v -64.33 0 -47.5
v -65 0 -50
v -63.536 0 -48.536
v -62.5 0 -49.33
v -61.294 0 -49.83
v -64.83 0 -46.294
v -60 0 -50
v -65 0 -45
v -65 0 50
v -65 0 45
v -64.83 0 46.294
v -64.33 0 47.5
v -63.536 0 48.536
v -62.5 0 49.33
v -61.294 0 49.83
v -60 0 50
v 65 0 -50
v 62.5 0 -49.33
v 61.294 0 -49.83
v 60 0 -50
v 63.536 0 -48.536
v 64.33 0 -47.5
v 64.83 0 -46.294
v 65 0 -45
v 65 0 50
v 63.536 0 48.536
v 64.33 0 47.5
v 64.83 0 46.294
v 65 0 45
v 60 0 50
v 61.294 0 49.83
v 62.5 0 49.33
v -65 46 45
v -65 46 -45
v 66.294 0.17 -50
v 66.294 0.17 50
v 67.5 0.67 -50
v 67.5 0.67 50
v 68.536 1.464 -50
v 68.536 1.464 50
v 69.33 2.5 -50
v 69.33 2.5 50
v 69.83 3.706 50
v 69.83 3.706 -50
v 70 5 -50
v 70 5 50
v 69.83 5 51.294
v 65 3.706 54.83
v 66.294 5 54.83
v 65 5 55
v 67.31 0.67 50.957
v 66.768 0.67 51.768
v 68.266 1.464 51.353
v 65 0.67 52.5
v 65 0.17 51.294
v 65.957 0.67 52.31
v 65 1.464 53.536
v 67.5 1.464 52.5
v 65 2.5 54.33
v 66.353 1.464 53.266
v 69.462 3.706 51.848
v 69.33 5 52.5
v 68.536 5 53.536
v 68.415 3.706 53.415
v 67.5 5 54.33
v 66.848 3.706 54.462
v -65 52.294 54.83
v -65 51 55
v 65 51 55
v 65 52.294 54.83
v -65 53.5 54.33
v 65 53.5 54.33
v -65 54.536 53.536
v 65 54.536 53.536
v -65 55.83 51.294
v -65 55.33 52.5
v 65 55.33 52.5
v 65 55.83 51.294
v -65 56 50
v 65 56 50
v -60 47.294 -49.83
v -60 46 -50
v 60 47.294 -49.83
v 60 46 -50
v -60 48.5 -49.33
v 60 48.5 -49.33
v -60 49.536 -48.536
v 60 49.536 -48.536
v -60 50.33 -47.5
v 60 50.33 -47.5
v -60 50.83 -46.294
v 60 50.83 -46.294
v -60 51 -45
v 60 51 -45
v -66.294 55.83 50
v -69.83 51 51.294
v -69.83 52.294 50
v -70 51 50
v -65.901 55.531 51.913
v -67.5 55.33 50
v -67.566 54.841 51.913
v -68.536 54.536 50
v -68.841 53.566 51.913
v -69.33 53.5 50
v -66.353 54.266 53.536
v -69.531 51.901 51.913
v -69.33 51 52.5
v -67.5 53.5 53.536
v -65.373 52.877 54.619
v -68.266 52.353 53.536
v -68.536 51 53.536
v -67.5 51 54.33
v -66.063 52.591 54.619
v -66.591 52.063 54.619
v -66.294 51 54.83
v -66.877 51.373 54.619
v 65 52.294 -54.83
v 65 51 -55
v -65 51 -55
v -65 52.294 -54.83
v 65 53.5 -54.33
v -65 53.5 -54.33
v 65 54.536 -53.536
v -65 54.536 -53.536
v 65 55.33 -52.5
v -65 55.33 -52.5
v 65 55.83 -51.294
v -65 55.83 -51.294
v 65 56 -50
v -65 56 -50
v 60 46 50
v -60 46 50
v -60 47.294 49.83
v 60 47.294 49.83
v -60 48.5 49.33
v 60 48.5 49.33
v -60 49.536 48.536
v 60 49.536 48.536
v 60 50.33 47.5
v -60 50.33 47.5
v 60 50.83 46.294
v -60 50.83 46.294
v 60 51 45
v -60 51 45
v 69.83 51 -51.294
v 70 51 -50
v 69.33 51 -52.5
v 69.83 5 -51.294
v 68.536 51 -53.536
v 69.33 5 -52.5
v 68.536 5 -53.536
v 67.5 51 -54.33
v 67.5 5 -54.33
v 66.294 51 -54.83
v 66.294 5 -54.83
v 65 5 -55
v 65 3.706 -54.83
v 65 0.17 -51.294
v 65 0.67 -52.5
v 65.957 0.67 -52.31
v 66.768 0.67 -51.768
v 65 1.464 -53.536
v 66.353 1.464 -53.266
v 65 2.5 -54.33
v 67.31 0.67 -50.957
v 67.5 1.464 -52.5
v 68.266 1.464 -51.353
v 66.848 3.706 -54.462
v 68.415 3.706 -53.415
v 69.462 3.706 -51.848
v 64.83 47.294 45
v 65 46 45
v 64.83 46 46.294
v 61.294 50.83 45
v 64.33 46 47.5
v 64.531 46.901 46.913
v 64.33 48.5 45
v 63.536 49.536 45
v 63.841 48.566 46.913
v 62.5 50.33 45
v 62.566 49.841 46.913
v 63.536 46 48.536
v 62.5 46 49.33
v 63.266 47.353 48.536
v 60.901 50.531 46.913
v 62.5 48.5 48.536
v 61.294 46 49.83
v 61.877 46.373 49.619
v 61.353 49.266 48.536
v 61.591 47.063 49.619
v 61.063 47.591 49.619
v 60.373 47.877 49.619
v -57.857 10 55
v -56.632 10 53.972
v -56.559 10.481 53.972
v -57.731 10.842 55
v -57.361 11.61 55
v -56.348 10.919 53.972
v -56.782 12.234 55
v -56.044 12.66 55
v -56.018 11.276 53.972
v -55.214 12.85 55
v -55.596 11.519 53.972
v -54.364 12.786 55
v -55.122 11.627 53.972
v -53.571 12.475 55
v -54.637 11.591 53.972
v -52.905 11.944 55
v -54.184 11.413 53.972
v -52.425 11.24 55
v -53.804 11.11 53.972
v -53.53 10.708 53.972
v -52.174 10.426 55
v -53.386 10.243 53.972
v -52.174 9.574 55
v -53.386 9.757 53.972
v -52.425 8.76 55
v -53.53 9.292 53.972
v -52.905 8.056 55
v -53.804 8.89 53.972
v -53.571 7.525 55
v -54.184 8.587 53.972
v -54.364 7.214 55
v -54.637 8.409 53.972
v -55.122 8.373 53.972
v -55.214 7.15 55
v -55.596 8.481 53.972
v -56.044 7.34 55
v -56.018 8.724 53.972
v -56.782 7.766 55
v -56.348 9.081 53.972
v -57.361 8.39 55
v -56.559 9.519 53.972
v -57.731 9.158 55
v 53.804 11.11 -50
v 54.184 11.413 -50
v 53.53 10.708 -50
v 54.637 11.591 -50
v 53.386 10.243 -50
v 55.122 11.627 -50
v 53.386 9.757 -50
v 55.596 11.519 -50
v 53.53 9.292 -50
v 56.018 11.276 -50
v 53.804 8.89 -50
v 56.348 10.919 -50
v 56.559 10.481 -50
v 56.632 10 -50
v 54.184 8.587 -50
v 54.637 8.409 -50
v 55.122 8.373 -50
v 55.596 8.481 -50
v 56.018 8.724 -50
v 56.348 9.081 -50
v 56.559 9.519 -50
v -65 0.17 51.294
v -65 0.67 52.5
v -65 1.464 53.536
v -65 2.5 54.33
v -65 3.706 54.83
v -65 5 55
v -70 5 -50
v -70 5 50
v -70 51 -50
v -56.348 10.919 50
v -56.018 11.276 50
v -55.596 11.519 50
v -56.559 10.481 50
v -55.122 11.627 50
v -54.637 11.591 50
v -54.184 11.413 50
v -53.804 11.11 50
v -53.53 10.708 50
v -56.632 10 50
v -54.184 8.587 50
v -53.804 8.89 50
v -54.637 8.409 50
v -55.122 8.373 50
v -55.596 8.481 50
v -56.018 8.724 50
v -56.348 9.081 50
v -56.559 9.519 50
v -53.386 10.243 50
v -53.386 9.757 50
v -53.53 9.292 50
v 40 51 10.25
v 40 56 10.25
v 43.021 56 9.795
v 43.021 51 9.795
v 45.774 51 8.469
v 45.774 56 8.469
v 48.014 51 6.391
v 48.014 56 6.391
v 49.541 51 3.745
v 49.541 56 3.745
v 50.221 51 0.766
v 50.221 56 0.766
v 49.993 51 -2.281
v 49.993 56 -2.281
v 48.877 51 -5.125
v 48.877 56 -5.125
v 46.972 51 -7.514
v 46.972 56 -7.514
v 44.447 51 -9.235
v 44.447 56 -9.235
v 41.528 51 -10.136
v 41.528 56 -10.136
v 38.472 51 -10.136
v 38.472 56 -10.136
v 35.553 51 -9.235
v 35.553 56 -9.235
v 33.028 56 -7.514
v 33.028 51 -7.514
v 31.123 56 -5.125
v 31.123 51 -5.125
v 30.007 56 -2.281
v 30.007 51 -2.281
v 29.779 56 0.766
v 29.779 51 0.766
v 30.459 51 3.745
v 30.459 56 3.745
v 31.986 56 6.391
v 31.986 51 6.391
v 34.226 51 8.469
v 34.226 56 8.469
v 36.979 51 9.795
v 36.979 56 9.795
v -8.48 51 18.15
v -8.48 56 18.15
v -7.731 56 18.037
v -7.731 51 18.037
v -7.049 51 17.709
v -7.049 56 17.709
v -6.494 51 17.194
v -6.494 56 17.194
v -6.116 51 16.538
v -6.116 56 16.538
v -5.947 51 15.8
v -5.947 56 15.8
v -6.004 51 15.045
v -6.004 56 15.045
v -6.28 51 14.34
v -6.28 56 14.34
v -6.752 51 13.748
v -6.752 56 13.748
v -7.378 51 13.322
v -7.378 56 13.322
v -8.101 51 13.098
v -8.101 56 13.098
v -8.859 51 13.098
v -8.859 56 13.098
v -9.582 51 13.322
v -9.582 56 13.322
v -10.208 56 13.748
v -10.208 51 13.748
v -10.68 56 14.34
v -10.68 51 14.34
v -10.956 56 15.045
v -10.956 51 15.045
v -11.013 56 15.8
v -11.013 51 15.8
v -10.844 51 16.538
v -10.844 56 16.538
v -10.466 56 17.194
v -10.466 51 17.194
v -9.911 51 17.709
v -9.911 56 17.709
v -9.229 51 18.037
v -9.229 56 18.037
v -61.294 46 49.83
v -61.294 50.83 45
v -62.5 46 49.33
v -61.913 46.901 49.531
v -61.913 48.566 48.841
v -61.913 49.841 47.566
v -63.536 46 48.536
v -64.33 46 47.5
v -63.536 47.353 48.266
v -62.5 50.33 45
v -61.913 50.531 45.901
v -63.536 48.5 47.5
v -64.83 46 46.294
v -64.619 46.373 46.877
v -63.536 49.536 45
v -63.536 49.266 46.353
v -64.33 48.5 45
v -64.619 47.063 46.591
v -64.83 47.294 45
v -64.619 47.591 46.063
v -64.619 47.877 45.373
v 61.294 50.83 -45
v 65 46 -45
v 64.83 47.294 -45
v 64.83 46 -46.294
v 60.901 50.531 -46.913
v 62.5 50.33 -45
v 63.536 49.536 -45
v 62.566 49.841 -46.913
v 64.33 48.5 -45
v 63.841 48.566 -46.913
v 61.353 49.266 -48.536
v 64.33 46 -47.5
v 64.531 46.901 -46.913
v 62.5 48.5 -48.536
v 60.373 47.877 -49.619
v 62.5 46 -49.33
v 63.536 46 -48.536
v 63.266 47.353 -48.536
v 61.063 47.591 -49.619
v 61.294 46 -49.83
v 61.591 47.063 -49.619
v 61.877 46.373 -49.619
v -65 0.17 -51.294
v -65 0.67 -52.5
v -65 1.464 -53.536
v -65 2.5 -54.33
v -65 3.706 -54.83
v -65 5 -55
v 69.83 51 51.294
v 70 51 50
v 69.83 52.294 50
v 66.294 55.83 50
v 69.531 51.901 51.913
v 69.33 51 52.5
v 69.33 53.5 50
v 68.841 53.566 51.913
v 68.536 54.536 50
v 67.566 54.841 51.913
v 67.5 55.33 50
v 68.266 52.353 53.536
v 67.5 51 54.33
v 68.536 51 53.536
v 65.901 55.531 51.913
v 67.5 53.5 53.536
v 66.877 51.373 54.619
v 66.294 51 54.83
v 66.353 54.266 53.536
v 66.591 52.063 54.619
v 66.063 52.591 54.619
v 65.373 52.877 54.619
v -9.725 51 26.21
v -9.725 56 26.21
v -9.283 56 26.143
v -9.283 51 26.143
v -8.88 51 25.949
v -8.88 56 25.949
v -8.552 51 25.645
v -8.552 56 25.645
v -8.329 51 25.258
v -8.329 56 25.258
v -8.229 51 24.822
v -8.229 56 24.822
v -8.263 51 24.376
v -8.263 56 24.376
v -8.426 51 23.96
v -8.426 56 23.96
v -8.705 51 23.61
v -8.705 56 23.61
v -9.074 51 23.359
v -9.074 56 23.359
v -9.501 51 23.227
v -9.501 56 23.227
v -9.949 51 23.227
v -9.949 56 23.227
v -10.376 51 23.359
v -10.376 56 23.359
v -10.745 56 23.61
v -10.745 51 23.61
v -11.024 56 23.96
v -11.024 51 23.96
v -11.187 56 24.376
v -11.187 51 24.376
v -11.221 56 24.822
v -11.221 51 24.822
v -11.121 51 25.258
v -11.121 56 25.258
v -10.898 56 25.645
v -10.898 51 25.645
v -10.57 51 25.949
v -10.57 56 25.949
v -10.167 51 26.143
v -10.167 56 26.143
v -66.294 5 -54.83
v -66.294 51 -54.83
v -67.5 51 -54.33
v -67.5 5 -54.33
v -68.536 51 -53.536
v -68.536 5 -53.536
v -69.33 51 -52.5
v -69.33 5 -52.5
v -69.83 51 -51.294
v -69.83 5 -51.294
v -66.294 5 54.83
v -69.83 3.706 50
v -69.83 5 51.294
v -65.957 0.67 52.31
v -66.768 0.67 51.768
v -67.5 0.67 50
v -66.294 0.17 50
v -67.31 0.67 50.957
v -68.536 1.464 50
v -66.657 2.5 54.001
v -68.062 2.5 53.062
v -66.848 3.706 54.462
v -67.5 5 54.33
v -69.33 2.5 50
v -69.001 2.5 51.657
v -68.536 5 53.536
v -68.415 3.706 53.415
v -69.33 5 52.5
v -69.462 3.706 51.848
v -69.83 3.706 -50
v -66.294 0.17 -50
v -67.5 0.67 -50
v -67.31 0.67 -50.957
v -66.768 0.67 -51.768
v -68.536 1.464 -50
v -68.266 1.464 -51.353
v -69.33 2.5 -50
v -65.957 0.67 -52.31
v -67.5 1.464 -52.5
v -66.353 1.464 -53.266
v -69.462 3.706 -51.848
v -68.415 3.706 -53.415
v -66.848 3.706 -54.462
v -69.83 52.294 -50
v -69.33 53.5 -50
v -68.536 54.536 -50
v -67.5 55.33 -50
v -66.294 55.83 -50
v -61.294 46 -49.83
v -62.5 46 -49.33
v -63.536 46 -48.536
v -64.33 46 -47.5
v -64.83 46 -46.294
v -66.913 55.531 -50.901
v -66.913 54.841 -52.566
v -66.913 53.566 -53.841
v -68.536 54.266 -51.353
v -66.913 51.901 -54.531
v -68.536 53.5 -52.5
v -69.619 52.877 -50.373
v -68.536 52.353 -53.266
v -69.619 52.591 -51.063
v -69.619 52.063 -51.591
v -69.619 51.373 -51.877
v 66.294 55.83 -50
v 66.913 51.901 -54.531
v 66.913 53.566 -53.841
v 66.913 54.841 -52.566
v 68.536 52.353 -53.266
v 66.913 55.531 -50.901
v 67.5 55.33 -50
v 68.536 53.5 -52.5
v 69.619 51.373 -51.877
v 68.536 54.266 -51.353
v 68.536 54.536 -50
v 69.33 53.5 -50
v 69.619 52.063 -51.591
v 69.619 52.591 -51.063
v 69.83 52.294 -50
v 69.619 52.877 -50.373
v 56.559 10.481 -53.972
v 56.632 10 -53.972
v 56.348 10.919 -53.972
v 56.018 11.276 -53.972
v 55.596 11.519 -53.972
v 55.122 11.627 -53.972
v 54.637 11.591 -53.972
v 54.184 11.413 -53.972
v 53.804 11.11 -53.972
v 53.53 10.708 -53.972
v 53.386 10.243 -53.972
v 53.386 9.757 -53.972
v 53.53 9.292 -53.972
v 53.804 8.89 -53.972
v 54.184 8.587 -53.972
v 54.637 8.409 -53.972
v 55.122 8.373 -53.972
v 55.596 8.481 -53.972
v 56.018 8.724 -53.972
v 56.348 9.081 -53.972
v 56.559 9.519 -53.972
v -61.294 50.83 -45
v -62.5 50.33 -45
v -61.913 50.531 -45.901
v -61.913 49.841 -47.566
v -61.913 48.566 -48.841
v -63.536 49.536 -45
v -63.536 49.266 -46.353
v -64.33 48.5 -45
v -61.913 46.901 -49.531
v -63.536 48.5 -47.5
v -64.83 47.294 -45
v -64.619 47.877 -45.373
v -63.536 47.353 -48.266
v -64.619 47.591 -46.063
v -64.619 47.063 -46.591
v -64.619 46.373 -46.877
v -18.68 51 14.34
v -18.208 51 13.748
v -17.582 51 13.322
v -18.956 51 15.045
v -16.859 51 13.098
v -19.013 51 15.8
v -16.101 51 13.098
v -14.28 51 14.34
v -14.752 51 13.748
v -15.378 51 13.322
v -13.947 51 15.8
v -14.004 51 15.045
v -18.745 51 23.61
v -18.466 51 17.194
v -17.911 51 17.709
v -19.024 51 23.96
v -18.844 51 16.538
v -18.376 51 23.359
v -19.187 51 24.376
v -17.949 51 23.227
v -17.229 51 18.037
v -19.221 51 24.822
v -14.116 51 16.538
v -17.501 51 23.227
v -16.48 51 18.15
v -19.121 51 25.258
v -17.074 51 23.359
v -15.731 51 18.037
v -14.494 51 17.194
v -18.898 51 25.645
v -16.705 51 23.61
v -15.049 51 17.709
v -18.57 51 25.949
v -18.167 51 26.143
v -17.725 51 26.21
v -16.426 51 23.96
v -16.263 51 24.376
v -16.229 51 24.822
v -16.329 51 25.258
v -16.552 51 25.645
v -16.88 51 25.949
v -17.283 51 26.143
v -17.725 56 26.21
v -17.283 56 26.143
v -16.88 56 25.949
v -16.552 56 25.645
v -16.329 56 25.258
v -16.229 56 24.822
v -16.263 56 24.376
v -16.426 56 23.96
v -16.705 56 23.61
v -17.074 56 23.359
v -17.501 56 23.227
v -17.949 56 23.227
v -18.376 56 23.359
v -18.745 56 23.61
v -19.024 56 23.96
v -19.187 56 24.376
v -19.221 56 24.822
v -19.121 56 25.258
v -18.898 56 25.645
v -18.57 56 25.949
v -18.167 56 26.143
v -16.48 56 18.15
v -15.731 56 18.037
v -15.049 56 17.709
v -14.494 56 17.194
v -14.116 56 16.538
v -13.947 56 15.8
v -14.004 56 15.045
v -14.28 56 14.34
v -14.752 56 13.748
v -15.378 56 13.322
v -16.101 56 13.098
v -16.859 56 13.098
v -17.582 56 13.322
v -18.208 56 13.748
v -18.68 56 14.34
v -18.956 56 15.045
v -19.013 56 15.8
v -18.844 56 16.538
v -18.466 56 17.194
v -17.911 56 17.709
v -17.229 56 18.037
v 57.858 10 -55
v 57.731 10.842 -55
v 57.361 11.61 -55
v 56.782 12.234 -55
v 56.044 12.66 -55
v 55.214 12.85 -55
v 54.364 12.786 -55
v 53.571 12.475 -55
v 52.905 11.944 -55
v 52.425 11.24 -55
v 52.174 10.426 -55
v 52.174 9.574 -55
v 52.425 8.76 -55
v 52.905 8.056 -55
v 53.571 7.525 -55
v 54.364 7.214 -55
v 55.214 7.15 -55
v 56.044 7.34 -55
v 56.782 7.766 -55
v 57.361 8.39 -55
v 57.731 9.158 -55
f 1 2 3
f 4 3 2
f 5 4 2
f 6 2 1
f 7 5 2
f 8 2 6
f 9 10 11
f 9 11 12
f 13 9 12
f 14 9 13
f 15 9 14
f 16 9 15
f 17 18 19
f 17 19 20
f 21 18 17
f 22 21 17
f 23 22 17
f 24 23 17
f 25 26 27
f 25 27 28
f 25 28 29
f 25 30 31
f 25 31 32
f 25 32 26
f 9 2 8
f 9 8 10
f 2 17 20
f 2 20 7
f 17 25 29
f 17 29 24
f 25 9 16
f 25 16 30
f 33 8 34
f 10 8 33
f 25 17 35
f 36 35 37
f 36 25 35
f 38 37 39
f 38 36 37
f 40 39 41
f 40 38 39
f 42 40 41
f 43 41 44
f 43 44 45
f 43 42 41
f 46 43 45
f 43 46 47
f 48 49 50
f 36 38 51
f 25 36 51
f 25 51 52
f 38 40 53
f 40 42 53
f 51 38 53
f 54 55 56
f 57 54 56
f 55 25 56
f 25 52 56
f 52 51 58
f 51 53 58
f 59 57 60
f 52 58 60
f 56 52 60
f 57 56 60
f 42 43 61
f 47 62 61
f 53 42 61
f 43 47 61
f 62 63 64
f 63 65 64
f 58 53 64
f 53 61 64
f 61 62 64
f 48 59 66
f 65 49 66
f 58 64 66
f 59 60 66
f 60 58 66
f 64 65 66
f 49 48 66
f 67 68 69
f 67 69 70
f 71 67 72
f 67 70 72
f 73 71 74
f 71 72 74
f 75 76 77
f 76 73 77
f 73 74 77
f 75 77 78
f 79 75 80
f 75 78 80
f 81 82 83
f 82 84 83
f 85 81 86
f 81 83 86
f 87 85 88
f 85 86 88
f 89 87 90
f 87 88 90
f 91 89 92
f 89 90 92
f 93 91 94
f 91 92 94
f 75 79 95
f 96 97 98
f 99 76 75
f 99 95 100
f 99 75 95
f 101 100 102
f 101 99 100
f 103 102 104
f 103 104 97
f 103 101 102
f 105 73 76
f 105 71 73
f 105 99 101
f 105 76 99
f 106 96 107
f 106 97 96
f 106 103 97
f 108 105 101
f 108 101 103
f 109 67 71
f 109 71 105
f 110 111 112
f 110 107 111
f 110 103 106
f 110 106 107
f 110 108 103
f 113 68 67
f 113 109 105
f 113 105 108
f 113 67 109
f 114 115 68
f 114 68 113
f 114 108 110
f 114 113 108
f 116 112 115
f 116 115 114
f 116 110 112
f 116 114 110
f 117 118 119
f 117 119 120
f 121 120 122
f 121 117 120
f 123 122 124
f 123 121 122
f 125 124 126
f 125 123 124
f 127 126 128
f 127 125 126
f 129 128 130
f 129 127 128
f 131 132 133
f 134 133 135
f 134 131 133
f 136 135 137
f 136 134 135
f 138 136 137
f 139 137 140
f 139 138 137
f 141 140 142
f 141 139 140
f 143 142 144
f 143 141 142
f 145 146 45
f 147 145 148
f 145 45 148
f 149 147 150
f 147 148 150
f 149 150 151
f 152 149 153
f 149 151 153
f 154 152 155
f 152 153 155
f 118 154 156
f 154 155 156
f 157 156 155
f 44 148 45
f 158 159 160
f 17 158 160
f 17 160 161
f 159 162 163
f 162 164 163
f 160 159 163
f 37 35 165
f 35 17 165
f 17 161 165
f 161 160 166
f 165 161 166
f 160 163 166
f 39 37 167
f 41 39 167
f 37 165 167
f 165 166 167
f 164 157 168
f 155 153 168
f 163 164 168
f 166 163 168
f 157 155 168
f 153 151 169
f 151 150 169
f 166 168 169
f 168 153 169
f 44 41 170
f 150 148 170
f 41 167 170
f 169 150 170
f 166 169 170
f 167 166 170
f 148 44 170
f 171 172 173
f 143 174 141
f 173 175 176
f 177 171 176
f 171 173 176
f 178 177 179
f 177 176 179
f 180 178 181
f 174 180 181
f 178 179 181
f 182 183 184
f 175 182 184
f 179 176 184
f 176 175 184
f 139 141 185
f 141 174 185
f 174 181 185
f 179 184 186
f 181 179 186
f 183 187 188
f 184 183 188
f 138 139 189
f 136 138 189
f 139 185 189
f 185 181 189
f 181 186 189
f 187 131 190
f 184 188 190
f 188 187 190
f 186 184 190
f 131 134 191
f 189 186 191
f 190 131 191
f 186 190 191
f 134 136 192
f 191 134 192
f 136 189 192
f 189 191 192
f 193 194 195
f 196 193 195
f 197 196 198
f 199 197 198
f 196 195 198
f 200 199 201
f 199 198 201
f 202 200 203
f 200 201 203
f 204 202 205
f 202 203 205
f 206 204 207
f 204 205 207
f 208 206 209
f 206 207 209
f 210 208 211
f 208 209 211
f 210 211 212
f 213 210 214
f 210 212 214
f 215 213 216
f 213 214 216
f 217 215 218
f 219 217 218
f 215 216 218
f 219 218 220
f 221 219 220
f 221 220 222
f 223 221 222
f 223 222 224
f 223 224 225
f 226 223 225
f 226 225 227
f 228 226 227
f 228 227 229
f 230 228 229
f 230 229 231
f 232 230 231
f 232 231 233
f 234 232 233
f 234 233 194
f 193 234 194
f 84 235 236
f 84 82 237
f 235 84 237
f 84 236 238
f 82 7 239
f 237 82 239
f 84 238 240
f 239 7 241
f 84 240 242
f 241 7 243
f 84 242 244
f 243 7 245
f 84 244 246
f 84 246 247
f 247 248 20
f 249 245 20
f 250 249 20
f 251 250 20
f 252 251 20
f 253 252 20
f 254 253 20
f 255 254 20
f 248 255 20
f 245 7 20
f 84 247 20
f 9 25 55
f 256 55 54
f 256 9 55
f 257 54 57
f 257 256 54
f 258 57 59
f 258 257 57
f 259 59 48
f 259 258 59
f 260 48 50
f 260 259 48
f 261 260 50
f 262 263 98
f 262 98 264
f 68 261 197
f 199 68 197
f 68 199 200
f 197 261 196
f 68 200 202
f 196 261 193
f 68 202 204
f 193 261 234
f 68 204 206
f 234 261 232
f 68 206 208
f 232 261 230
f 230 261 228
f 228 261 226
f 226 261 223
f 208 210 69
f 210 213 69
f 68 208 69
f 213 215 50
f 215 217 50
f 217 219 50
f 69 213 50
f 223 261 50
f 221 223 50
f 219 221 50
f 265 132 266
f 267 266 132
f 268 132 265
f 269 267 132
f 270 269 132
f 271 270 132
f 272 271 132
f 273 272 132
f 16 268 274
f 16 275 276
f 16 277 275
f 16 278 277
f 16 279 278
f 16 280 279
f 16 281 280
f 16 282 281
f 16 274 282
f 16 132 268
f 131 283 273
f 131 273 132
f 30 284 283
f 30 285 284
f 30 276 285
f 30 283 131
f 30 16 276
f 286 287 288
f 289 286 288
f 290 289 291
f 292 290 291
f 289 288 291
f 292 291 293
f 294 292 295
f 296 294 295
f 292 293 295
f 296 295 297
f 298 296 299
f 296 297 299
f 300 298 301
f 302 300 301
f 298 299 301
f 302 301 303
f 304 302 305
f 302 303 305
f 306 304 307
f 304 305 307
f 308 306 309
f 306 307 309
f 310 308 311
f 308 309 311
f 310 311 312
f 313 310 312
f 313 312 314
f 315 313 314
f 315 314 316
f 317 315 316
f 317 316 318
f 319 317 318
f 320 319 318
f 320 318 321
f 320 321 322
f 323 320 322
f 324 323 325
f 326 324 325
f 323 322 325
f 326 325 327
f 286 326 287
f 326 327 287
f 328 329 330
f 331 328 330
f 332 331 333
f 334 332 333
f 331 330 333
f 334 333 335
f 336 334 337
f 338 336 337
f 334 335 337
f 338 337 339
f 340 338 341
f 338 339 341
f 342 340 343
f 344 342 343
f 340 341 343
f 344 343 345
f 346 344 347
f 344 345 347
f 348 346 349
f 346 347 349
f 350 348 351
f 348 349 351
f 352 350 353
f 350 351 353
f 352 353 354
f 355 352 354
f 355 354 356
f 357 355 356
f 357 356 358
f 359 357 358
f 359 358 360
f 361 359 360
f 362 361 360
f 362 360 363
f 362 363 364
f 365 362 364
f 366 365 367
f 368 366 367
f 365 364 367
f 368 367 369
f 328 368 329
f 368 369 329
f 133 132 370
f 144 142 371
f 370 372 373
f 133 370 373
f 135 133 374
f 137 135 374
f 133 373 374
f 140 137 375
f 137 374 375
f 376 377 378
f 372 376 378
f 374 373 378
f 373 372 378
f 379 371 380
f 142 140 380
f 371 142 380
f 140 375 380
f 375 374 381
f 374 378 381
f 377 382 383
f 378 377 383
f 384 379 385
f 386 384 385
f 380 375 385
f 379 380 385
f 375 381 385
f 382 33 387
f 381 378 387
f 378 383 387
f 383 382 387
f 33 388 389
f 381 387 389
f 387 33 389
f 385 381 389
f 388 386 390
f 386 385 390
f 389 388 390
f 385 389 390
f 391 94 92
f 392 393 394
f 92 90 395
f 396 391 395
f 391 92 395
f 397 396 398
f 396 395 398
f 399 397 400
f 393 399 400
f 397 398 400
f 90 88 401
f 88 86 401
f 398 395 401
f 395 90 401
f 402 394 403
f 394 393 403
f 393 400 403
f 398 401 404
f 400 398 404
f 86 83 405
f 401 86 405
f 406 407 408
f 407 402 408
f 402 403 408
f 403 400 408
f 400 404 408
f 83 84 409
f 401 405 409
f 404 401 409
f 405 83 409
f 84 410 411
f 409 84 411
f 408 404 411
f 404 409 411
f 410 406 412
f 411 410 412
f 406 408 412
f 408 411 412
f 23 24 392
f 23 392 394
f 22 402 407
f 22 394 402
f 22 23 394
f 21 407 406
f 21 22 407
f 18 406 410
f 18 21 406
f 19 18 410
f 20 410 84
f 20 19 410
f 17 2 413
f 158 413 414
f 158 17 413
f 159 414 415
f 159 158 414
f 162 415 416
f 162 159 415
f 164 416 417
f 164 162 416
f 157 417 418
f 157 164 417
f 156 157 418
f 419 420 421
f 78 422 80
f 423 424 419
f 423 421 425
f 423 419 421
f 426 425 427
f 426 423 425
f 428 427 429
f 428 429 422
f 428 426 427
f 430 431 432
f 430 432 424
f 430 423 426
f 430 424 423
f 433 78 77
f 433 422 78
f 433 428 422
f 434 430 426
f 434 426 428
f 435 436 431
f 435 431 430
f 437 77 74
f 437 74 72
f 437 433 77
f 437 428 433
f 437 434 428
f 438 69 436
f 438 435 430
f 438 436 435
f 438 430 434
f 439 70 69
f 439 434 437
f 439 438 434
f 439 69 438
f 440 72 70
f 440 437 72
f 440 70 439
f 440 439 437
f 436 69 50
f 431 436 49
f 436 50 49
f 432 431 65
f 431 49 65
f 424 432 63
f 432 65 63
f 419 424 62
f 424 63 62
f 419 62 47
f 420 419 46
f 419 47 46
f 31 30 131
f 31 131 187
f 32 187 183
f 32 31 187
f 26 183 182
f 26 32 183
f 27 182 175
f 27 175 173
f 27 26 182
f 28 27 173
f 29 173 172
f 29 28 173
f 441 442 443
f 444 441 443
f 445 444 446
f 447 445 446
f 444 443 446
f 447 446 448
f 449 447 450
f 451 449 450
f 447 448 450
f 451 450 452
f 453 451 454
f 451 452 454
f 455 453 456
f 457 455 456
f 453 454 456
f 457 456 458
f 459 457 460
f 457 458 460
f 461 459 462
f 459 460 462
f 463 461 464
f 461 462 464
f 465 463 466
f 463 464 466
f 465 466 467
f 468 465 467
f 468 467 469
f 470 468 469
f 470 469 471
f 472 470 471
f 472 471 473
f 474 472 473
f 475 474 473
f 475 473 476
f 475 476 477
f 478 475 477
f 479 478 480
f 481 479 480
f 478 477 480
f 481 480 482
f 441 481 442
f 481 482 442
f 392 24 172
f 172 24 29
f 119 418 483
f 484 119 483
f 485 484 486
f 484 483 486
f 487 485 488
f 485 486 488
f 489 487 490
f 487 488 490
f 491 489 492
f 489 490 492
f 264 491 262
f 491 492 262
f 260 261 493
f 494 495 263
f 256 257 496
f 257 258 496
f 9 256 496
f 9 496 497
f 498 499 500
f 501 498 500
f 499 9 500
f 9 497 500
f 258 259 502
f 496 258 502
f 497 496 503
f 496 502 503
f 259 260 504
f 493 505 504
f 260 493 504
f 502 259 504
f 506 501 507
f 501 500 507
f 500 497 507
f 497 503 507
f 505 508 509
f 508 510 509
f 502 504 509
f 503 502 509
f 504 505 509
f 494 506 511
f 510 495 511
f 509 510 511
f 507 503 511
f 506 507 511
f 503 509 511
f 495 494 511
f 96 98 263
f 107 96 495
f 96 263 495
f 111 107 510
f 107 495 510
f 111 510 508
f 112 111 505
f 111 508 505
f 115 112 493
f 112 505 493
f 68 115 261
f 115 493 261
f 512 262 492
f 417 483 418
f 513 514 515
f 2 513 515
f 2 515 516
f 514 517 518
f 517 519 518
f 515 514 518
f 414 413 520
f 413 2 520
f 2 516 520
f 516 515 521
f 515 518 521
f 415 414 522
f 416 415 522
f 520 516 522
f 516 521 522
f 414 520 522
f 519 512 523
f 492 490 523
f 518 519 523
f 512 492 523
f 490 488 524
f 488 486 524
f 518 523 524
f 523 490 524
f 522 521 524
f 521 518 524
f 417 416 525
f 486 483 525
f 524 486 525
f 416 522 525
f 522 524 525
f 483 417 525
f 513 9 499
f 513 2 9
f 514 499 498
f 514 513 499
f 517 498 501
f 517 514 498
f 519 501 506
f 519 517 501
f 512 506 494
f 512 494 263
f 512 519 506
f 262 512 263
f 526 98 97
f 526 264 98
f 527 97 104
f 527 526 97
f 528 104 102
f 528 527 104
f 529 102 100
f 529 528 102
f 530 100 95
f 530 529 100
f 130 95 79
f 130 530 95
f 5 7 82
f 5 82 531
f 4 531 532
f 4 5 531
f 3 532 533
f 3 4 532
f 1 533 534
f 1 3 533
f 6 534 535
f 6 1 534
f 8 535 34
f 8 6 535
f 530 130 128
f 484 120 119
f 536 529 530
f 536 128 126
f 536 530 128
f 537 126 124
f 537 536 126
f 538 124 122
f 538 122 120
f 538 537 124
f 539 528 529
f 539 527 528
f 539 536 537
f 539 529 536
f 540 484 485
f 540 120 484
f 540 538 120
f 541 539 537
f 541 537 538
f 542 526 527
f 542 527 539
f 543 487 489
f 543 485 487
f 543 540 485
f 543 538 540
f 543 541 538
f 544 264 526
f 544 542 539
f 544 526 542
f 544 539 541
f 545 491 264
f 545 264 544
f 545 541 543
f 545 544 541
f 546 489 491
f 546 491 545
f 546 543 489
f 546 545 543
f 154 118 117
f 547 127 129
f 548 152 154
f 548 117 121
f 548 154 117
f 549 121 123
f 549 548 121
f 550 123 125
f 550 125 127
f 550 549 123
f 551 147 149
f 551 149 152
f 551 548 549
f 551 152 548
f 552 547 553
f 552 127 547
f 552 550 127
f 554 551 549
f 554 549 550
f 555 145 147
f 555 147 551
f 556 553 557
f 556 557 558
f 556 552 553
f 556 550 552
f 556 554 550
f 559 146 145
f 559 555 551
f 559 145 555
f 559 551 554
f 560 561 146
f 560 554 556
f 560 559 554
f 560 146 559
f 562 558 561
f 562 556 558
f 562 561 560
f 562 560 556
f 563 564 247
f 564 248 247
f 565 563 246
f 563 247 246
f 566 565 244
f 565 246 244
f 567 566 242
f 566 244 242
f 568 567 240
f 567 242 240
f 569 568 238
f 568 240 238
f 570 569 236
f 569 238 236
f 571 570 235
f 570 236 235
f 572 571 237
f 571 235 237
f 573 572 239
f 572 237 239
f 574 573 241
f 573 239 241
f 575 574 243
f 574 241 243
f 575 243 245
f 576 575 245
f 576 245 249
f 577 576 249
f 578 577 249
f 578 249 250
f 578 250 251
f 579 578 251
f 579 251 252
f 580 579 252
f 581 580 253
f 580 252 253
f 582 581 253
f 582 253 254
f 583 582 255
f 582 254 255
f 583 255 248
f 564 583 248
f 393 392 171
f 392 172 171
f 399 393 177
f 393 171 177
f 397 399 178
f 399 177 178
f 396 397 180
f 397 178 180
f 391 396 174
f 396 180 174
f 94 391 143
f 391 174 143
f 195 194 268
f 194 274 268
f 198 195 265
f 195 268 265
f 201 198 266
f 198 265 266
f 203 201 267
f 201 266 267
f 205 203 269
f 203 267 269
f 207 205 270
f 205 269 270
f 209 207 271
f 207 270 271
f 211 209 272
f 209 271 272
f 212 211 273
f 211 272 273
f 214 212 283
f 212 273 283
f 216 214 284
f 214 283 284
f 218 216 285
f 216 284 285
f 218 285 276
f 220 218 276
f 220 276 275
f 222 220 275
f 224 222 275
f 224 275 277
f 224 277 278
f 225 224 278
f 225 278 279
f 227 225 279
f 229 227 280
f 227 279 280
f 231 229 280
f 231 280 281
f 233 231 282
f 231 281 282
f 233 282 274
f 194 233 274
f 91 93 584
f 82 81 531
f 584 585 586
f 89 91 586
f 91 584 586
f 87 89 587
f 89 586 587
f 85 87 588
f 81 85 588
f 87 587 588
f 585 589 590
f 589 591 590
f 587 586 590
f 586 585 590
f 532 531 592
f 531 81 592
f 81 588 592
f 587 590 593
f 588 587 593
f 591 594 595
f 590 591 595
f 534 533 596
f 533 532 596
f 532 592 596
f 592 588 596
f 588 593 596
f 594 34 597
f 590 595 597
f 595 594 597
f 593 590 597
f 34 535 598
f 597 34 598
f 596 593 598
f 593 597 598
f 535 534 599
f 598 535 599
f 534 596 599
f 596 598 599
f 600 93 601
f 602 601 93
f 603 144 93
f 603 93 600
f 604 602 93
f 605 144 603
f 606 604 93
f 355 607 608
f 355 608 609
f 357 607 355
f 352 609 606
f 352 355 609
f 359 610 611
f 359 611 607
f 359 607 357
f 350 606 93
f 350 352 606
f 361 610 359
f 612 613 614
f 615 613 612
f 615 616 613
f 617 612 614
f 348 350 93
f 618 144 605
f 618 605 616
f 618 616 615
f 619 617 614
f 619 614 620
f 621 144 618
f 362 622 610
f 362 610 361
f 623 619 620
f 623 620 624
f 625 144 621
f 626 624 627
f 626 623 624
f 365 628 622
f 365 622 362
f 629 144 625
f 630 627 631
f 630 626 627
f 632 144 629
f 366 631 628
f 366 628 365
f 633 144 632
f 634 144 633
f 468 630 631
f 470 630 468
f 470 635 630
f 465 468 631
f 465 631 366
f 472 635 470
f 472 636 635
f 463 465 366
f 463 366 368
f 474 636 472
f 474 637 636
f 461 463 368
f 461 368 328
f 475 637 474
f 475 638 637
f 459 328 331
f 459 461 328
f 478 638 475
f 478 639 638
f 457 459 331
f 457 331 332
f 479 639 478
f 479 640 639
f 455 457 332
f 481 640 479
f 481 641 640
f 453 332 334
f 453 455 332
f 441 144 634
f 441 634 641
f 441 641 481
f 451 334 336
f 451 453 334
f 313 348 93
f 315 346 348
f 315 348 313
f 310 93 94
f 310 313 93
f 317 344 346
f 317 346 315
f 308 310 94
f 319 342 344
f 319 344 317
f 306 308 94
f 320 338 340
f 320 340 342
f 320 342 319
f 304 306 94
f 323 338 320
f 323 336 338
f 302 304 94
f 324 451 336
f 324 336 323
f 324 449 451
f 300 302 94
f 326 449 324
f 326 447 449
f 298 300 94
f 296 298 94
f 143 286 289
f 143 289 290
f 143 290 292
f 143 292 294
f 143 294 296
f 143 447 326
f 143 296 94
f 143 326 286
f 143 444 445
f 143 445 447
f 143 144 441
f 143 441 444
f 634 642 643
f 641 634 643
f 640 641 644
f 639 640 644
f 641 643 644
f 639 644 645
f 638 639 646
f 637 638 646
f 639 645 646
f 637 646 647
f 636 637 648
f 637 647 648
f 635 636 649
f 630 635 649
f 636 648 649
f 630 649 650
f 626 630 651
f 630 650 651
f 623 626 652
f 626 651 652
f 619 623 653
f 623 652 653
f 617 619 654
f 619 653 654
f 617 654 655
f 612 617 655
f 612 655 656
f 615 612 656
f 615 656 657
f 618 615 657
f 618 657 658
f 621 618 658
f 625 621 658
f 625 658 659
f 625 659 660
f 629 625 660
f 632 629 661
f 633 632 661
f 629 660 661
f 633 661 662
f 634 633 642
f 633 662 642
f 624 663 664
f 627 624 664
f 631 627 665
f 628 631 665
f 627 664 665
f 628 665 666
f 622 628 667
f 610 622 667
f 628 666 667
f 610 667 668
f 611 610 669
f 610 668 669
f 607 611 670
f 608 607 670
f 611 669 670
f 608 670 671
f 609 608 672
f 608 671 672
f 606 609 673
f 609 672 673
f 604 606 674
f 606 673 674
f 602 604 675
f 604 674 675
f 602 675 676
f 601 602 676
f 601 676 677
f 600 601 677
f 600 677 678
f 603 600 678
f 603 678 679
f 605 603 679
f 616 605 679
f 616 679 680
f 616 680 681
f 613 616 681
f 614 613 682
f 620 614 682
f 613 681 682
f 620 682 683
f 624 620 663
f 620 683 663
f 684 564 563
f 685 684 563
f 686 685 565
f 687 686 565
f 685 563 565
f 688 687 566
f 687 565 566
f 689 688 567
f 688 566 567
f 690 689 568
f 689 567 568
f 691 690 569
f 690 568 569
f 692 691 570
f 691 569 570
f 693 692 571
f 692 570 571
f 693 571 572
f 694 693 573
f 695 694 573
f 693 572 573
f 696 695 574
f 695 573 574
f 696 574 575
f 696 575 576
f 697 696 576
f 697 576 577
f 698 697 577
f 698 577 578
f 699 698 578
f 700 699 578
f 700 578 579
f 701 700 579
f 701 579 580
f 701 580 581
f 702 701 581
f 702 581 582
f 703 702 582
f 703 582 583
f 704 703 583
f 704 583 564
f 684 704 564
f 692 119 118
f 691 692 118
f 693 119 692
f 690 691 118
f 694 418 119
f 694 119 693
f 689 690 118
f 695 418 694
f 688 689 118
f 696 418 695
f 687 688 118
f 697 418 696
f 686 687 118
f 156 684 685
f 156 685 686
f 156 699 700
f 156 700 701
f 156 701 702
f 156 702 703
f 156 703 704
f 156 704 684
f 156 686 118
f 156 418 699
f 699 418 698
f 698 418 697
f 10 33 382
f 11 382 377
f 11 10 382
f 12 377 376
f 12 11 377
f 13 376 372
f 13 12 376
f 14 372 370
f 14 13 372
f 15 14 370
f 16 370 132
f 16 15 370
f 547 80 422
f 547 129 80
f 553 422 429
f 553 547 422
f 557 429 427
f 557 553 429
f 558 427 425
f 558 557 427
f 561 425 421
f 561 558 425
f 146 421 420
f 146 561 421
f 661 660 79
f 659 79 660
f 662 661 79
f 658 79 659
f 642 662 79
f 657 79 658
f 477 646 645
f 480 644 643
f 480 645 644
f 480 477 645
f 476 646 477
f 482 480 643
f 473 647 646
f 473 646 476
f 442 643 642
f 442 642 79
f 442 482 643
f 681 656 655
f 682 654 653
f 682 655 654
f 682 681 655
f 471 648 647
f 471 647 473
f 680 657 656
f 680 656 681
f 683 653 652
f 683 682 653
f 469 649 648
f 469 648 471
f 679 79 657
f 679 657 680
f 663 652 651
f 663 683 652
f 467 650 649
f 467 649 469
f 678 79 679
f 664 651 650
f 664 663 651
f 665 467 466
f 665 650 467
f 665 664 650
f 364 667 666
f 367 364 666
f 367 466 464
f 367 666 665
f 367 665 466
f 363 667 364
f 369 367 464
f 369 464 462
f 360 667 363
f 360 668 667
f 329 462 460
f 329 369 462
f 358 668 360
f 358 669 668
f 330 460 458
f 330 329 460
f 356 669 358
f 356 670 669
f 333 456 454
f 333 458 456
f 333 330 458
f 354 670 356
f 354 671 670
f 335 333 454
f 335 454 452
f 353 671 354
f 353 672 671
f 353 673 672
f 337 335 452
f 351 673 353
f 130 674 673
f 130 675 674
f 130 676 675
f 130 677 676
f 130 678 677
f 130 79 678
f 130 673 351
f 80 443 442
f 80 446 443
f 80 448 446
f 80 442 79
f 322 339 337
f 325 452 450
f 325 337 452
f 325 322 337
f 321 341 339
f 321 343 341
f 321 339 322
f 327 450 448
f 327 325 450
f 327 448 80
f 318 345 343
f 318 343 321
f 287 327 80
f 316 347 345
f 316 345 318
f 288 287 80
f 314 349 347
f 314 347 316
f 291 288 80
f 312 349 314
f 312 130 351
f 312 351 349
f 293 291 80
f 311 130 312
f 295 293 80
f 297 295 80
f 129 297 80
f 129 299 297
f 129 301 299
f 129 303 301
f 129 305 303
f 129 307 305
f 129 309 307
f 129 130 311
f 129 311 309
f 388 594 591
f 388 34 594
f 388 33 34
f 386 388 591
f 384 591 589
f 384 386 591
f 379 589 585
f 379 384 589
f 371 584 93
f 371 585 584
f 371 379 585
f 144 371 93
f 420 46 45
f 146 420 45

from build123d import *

# Parameters (mm, degrees)
SKETCH1_W                                         = 140
SKETCH1_H                                         = 110
BOSS_EXTRUDE1_DEPTH                               = 56
SKETCH2_W                                         = 130
SKETCH2_H                                         = 100
CUT_EXTRUDE1_DEPTH                                = 51
FILLET1_R                                         = 5
FILLET2_R                                         = 5
FILLET3_R                                         = 5
FILLET4_R                                         = 5
FILLET6_R                                         = 5
SKETCH3_R                                         = 2.54
CUT_EXTRUDE2_DEPTH                                = 5
SKETCH4_R                                         = 10.25
CUT_EXTRUDE3_DEPTH                                = 5
SKETCH5_R                                         = 1.5
CUT_EXTRUDE4_DEPTH                                = 5
CSK_FOR_4_FLAT_HEAD_MACHINE_SCREW_100_D           = 3.2639
CSK_FOR_4_FLAT_HEAD_MACHINE_SCREW_100_DEPTH       = 10
CSK_FOR_4_FLAT_HEAD_MACHINE_SCREW_100_CSINK_D     = 5.715
CSK_FOR_4_FLAT_HEAD_MACHINE_SCREW_100_CSINK_ANGLE = 100
CSK_FOR_4_FLAT_HEAD_MACHINE_SCREW_100_TIP         = 0.980574487
CSK_FOR_4_FLAT_HEAD_MACHINE_SCREW_2_D             = 3.2639
CSK_FOR_4_FLAT_HEAD_MACHINE_SCREW_2_DEPTH         = 10
CSK_FOR_4_FLAT_HEAD_MACHINE_SCREW_2_CSINK_D       = 5.715
CSK_FOR_4_FLAT_HEAD_MACHINE_SCREW_2_CSINK_ANGLE   = 100
CSK_FOR_4_FLAT_HEAD_MACHINE_SCREW_2_TIP           = 0.980574487


# Some blends are built 0.0001 mm under size
with BuildPart() as part:
    # Sketch1 → Boss-Extrude1 (new body)
    with BuildSketch(Plane(origin=(0, 0, 0), x_dir=(1, 0, 0), z_dir=(0, 1, 0))):
        Rectangle(SKETCH1_W, SKETCH1_H)
    extrude(amount=BOSS_EXTRUDE1_DEPTH)

    # Sketch2 → Cut-Extrude1 (cut)
    with BuildSketch(Plane.XZ):
        Rectangle(SKETCH2_W, SKETCH2_H)
    extrude(amount=-CUT_EXTRUDE1_DEPTH, mode=Mode.SUBTRACT)

    # Fillet1
    fillet1_edges = [part.edges().sort_by_distance(p)[0] for p in [
        (-70, 56, 0),
        (0, 56, 55),
        (70, 56, 0),
        (0, 56, -55),
    ]]
    fillet(fillet1_edges, radius=FILLET1_R)

    # Fillet2
    # the kernel refuses this fillet: 5 mm, written as the material it takes off along each edge
    with BuildSketch(Plane(origin=(65, 51, 50), x_dir=(1, 0, 0), z_dir=(0, 0, 1))) as fillet2_piece_1_section:
        Polygon((0, 0), (FILLET2_R, 0), (FILLET2_R, FILLET2_R), (0, FILLET2_R), align=None)
    fillet2_piece_1 = extrude(amount=FILLET2_R, mode=Mode.PRIVATE)
    fillet2_piece_1 = fillet2_piece_1 - Plane(origin=(65, 51, 50), x_dir=(-0.7071067811865475, -0.7071067811865475, 0), z_dir=(0, 0, 1)) * Sphere(FILLET2_R, mode=Mode.PRIVATE)
    add(fillet2_piece_1, mode=Mode.SUBTRACT)
    with BuildSketch(Plane(origin=(-65, 51, 50), x_dir=(-1, 0, 0), z_dir=(0, 0, 1))) as fillet2_piece_2_section:
        Polygon((0, 0), (FILLET2_R, 0), (FILLET2_R, -FILLET2_R), (0, -FILLET2_R), align=None)
    fillet2_piece_2 = extrude(amount=FILLET2_R, mode=Mode.PRIVATE)
    fillet2_piece_2 = fillet2_piece_2 - Plane(origin=(-65, 51, 50), x_dir=(0.7071067811865475, -0.7071067811865475, 0), z_dir=(0, 0, 1)) * Sphere(FILLET2_R, mode=Mode.PRIVATE)
    add(fillet2_piece_2, mode=Mode.SUBTRACT)
    with BuildSketch(Plane(origin=(65, 51, -50), x_dir=(0, 0, -1), z_dir=(1, 0, 0))) as fillet2_piece_3_section:
        Polygon((0, 0), (FILLET2_R, 0), (FILLET2_R, FILLET2_R), (0, FILLET2_R), align=None)
    fillet2_piece_3 = extrude(amount=FILLET2_R, mode=Mode.PRIVATE)
    fillet2_piece_3 = fillet2_piece_3 - Plane(origin=(65, 51, -50), x_dir=(0, -0.7071067811865475, 0.7071067811865475), z_dir=(1, 0, 0)) * Sphere(FILLET2_R, mode=Mode.PRIVATE)
    add(fillet2_piece_3, mode=Mode.SUBTRACT)
    with BuildSketch(Plane(origin=(-65, 51, -50), x_dir=(0, 0, -1), z_dir=(-1, 0, 0))) as fillet2_piece_4_section:
        Polygon((0, 0), (FILLET2_R, 0), (FILLET2_R, -FILLET2_R), (0, -FILLET2_R), align=None)
    fillet2_piece_4 = extrude(amount=FILLET2_R, mode=Mode.PRIVATE)
    fillet2_piece_4 = fillet2_piece_4 - Plane(origin=(-65, 51, -50), x_dir=(0, -0.7071067811865475, 0.7071067811865475), z_dir=(-1, 0, 0)) * Sphere(FILLET2_R, mode=Mode.PRIVATE)
    add(fillet2_piece_4, mode=Mode.SUBTRACT)
    with BuildSketch(Plane(origin=(-70, -12.5, -55), x_dir=(0, 0, 1), z_dir=(0, 1, 0)), Plane(origin=(-70, -12.5, 55), x_dir=(1, 0, 0), z_dir=(0, 1, 0))) as fillet2_piece_5:
        with BuildLine():
            CenterArc((FILLET2_R, FILLET2_R), FILLET2_R, 180, 90)
            Line((0, FILLET2_R), (0, 0))
            Line((0, 0), (FILLET2_R, 0))
        make_face()
    extrude(amount=63.5, mode=Mode.SUBTRACT)
    with BuildSketch(Plane(origin=(70, -12.5, -55), x_dir=(0, 0, 1), z_dir=(0, 1, 0)), Plane(origin=(70, -12.5, 55), x_dir=(-1, 0, 0), z_dir=(0, 1, 0))) as fillet2_piece_6:
        with BuildLine():
            CenterArc((FILLET2_R, -FILLET2_R), FILLET2_R, 90, 90)
            Line((0, -FILLET2_R), (0, 0))
            Line((0, 0), (FILLET2_R, 0))
        make_face()
    extrude(amount=63.5, mode=Mode.SUBTRACT)

    # Fillet3
    fillet3_edges = [part.edges().sort_by_distance(p)[0] for p in [
        (65, 51, 0),
        (0, 51, -50),
        (-65, 51, 0),
        (0, 51, 50),
    ]]
    fillet(fillet3_edges, radius=FILLET3_R)

    # Fillet4
    # the kernel refuses this fillet: 5 mm, written as the material it adds along each edge
    with BuildSketch(Plane(origin=(-60, 46, -45), x_dir=(0, 0, -1), z_dir=(-1, 0, 0))) as fillet4_piece_1_section:
        Polygon((0, 0), (FILLET4_R, 0), (FILLET4_R, -FILLET4_R), (0, -FILLET4_R), align=None)
    fillet4_piece_1 = extrude(amount=FILLET4_R, mode=Mode.PRIVATE)
    fillet4_piece_1 = fillet4_piece_1 - Plane(origin=(-60, 46, -45), x_dir=(0, -0.7071067811865475, 0.7071067811865475), z_dir=(-1, 0, 0)) * Sphere(FILLET4_R, mode=Mode.PRIVATE)
    add(fillet4_piece_1)
    with BuildSketch(Plane(origin=(-60, 46, 45), x_dir=(0, 0, 1), z_dir=(-1, 0, 0))) as fillet4_piece_2_section:
        Polygon((0, 0), (FILLET4_R, 0), (FILLET4_R, FILLET4_R), (0, FILLET4_R), align=None)
    fillet4_piece_2 = extrude(amount=FILLET4_R, mode=Mode.PRIVATE)
    fillet4_piece_2 = fillet4_piece_2 - Plane(origin=(-60, 46, 45), x_dir=(0, -0.7071067811865475, -0.7071067811865475), z_dir=(-1, 0, 0)) * Sphere(FILLET4_R, mode=Mode.PRIVATE)
    add(fillet4_piece_2)
    with BuildSketch(Plane(origin=(60, 46, -45), x_dir=(1, 0, 0), z_dir=(0, 0, -1))) as fillet4_piece_3_section:
        Polygon((0, 0), (FILLET4_R, 0), (FILLET4_R, -FILLET4_R), (0, -FILLET4_R), align=None)
    fillet4_piece_3 = extrude(amount=FILLET4_R, mode=Mode.PRIVATE)
    fillet4_piece_3 = fillet4_piece_3 - Plane(origin=(60, 46, -45), x_dir=(-0.7071067811865475, -0.7071067811865475, 0), z_dir=(0, 0, -1)) * Sphere(FILLET4_R, mode=Mode.PRIVATE)
    add(fillet4_piece_3)
    with BuildSketch(Plane(origin=(60, 46, 45), x_dir=(1, 0, 0), z_dir=(0, 0, 1))) as fillet4_piece_4_section:
        Polygon((0, 0), (FILLET4_R, 0), (FILLET4_R, FILLET4_R), (0, FILLET4_R), align=None)
    fillet4_piece_4 = extrude(amount=FILLET4_R, mode=Mode.PRIVATE)
    fillet4_piece_4 = fillet4_piece_4 - Plane(origin=(60, 46, 45), x_dir=(-0.7071067811865475, -0.7071067811865475, 0), z_dir=(0, 0, 1)) * Sphere(FILLET4_R, mode=Mode.PRIVATE)
    add(fillet4_piece_4)
    with BuildSketch(Plane(origin=(65, 0, 50), x_dir=(-1, 0, 0), z_dir=(0, 1, 0)), Plane(origin=(-65, 0, 50), x_dir=(0, 0, -1), z_dir=(0, 1, 0))) as fillet4_piece_5:
        with BuildLine():
            CenterArc((FILLET4_R, -FILLET4_R), FILLET4_R, 90, 90)
            Line((0, -FILLET4_R), (0, 0))
            Line((0, 0), (FILLET4_R, 0))
        make_face()
    extrude(amount=46)
    with BuildSketch(Plane(origin=(65, 0, -50), x_dir=(-1, 0, 0), z_dir=(0, 1, 0)), Plane(origin=(-65, 0, -50), x_dir=(0, 0, 1), z_dir=(0, 1, 0))) as fillet4_piece_6:
        with BuildLine():
            CenterArc((FILLET4_R, FILLET4_R), FILLET4_R, 180, 90)
            Line((0, FILLET4_R), (0, 0))
            Line((0, 0), (FILLET4_R, 0))
        make_face()
    extrude(amount=46)

    # Fillet6
    fillet6_edges = [part.edges().sort_by_distance(p)[0] for p in [
        (-70, 0, 0),
        (70, 0, 0),
        (0, 0, 55),
        (0, 0, -55),
        (-68.535533906, 0, 53.535533906),
        (68.535533906, 0, 53.535533906),
        (68.535533906, 0, -53.535533906),
        (-68.535533906, 0, -53.535533906),
    ]]
    fillet(fillet6_edges, radius=FILLET6_R - 0.0001)  # a hair under: the kernel refuses the full size

    # Sketch3 → Cut-Extrude2 (cut)
    with BuildSketch(Plane(origin=(0, 56, 0), x_dir=(1, 0, 0), z_dir=(0, 1, 0))):
        with Locations(Location((-16.48, -15.61, 0), (0, 0, 270))):
            Circle(SKETCH3_R)
        with Locations(Location((-8.48, -15.61, 0), (0, 0, 270))):
            Circle(SKETCH3_R)
    extrude(amount=-CUT_EXTRUDE2_DEPTH, mode=Mode.SUBTRACT)

    # Sketch4 → Cut-Extrude3 (cut)
    with BuildSketch(Plane(origin=(0, 56, 0), x_dir=(1, 0, 0), z_dir=(0, 1, 0))):
        with Locations(Location((40, 0, 0), (0, 0, 270))):
            Circle(SKETCH4_R)
    extrude(amount=-CUT_EXTRUDE3_DEPTH, mode=Mode.SUBTRACT)

    # Sketch5 → Cut-Extrude4 (cut)
    with BuildSketch(Plane(origin=(0, 56, 0), x_dir=(1, 0, 0), z_dir=(0, 1, 0))):
        with Locations(Location((-17.725, -24.71, 0), (0, 0, 270))):
            Circle(SKETCH5_R)
        with Locations(Location((-9.725, -24.71, 0), (0, 0, 270))):
            Circle(SKETCH5_R)
    extrude(amount=-CUT_EXTRUDE4_DEPTH, mode=Mode.SUBTRACT)

    # CSK for _4 Flat Head Machine Screw _100
    with Locations(Plane(origin=(58.965440854, 7.381222334, 55), x_dir=(1, 0, 0), z_dir=(0, 0, 1))):
        with Locations((-113.965440854, 2.618777666)):
            CounterSinkHole(CSK_FOR_4_FLAT_HEAD_MACHINE_SCREW_100_D / 2, CSK_FOR_4_FLAT_HEAD_MACHINE_SCREW_100_CSINK_D / 2, depth=CSK_FOR_4_FLAT_HEAD_MACHINE_SCREW_100_DEPTH, counter_sink_angle=CSK_FOR_4_FLAT_HEAD_MACHINE_SCREW_100_CSINK_ANGLE)
            with Locations((0, 0, -(CSK_FOR_4_FLAT_HEAD_MACHINE_SCREW_100_DEPTH + CSK_FOR_4_FLAT_HEAD_MACHINE_SCREW_100_TIP / 2))):  # 118° drill point
                Cone(0, CSK_FOR_4_FLAT_HEAD_MACHINE_SCREW_100_D / 2, CSK_FOR_4_FLAT_HEAD_MACHINE_SCREW_100_TIP, mode=Mode.SUBTRACT)

    # CSK for _4 Flat Head Machine Screw _ 2
    with Locations(Plane(origin=(58.965440854, 7.381222334, -55), x_dir=(-1, 0, 0), z_dir=(0, 0, -1))):
        with Locations((3.965440854, 2.618777666)):
            CounterSinkHole(CSK_FOR_4_FLAT_HEAD_MACHINE_SCREW_2_D / 2, CSK_FOR_4_FLAT_HEAD_MACHINE_SCREW_2_CSINK_D / 2, depth=CSK_FOR_4_FLAT_HEAD_MACHINE_SCREW_2_DEPTH, counter_sink_angle=CSK_FOR_4_FLAT_HEAD_MACHINE_SCREW_2_CSINK_ANGLE)
            with Locations((0, 0, -(CSK_FOR_4_FLAT_HEAD_MACHINE_SCREW_2_DEPTH + CSK_FOR_4_FLAT_HEAD_MACHINE_SCREW_2_TIP / 2))):  # 118° drill point
                Cone(0, CSK_FOR_4_FLAT_HEAD_MACHINE_SCREW_2_D / 2, CSK_FOR_4_FLAT_HEAD_MACHINE_SCREW_2_TIP, mode=Mode.SUBTRACT)


solid = part.part
